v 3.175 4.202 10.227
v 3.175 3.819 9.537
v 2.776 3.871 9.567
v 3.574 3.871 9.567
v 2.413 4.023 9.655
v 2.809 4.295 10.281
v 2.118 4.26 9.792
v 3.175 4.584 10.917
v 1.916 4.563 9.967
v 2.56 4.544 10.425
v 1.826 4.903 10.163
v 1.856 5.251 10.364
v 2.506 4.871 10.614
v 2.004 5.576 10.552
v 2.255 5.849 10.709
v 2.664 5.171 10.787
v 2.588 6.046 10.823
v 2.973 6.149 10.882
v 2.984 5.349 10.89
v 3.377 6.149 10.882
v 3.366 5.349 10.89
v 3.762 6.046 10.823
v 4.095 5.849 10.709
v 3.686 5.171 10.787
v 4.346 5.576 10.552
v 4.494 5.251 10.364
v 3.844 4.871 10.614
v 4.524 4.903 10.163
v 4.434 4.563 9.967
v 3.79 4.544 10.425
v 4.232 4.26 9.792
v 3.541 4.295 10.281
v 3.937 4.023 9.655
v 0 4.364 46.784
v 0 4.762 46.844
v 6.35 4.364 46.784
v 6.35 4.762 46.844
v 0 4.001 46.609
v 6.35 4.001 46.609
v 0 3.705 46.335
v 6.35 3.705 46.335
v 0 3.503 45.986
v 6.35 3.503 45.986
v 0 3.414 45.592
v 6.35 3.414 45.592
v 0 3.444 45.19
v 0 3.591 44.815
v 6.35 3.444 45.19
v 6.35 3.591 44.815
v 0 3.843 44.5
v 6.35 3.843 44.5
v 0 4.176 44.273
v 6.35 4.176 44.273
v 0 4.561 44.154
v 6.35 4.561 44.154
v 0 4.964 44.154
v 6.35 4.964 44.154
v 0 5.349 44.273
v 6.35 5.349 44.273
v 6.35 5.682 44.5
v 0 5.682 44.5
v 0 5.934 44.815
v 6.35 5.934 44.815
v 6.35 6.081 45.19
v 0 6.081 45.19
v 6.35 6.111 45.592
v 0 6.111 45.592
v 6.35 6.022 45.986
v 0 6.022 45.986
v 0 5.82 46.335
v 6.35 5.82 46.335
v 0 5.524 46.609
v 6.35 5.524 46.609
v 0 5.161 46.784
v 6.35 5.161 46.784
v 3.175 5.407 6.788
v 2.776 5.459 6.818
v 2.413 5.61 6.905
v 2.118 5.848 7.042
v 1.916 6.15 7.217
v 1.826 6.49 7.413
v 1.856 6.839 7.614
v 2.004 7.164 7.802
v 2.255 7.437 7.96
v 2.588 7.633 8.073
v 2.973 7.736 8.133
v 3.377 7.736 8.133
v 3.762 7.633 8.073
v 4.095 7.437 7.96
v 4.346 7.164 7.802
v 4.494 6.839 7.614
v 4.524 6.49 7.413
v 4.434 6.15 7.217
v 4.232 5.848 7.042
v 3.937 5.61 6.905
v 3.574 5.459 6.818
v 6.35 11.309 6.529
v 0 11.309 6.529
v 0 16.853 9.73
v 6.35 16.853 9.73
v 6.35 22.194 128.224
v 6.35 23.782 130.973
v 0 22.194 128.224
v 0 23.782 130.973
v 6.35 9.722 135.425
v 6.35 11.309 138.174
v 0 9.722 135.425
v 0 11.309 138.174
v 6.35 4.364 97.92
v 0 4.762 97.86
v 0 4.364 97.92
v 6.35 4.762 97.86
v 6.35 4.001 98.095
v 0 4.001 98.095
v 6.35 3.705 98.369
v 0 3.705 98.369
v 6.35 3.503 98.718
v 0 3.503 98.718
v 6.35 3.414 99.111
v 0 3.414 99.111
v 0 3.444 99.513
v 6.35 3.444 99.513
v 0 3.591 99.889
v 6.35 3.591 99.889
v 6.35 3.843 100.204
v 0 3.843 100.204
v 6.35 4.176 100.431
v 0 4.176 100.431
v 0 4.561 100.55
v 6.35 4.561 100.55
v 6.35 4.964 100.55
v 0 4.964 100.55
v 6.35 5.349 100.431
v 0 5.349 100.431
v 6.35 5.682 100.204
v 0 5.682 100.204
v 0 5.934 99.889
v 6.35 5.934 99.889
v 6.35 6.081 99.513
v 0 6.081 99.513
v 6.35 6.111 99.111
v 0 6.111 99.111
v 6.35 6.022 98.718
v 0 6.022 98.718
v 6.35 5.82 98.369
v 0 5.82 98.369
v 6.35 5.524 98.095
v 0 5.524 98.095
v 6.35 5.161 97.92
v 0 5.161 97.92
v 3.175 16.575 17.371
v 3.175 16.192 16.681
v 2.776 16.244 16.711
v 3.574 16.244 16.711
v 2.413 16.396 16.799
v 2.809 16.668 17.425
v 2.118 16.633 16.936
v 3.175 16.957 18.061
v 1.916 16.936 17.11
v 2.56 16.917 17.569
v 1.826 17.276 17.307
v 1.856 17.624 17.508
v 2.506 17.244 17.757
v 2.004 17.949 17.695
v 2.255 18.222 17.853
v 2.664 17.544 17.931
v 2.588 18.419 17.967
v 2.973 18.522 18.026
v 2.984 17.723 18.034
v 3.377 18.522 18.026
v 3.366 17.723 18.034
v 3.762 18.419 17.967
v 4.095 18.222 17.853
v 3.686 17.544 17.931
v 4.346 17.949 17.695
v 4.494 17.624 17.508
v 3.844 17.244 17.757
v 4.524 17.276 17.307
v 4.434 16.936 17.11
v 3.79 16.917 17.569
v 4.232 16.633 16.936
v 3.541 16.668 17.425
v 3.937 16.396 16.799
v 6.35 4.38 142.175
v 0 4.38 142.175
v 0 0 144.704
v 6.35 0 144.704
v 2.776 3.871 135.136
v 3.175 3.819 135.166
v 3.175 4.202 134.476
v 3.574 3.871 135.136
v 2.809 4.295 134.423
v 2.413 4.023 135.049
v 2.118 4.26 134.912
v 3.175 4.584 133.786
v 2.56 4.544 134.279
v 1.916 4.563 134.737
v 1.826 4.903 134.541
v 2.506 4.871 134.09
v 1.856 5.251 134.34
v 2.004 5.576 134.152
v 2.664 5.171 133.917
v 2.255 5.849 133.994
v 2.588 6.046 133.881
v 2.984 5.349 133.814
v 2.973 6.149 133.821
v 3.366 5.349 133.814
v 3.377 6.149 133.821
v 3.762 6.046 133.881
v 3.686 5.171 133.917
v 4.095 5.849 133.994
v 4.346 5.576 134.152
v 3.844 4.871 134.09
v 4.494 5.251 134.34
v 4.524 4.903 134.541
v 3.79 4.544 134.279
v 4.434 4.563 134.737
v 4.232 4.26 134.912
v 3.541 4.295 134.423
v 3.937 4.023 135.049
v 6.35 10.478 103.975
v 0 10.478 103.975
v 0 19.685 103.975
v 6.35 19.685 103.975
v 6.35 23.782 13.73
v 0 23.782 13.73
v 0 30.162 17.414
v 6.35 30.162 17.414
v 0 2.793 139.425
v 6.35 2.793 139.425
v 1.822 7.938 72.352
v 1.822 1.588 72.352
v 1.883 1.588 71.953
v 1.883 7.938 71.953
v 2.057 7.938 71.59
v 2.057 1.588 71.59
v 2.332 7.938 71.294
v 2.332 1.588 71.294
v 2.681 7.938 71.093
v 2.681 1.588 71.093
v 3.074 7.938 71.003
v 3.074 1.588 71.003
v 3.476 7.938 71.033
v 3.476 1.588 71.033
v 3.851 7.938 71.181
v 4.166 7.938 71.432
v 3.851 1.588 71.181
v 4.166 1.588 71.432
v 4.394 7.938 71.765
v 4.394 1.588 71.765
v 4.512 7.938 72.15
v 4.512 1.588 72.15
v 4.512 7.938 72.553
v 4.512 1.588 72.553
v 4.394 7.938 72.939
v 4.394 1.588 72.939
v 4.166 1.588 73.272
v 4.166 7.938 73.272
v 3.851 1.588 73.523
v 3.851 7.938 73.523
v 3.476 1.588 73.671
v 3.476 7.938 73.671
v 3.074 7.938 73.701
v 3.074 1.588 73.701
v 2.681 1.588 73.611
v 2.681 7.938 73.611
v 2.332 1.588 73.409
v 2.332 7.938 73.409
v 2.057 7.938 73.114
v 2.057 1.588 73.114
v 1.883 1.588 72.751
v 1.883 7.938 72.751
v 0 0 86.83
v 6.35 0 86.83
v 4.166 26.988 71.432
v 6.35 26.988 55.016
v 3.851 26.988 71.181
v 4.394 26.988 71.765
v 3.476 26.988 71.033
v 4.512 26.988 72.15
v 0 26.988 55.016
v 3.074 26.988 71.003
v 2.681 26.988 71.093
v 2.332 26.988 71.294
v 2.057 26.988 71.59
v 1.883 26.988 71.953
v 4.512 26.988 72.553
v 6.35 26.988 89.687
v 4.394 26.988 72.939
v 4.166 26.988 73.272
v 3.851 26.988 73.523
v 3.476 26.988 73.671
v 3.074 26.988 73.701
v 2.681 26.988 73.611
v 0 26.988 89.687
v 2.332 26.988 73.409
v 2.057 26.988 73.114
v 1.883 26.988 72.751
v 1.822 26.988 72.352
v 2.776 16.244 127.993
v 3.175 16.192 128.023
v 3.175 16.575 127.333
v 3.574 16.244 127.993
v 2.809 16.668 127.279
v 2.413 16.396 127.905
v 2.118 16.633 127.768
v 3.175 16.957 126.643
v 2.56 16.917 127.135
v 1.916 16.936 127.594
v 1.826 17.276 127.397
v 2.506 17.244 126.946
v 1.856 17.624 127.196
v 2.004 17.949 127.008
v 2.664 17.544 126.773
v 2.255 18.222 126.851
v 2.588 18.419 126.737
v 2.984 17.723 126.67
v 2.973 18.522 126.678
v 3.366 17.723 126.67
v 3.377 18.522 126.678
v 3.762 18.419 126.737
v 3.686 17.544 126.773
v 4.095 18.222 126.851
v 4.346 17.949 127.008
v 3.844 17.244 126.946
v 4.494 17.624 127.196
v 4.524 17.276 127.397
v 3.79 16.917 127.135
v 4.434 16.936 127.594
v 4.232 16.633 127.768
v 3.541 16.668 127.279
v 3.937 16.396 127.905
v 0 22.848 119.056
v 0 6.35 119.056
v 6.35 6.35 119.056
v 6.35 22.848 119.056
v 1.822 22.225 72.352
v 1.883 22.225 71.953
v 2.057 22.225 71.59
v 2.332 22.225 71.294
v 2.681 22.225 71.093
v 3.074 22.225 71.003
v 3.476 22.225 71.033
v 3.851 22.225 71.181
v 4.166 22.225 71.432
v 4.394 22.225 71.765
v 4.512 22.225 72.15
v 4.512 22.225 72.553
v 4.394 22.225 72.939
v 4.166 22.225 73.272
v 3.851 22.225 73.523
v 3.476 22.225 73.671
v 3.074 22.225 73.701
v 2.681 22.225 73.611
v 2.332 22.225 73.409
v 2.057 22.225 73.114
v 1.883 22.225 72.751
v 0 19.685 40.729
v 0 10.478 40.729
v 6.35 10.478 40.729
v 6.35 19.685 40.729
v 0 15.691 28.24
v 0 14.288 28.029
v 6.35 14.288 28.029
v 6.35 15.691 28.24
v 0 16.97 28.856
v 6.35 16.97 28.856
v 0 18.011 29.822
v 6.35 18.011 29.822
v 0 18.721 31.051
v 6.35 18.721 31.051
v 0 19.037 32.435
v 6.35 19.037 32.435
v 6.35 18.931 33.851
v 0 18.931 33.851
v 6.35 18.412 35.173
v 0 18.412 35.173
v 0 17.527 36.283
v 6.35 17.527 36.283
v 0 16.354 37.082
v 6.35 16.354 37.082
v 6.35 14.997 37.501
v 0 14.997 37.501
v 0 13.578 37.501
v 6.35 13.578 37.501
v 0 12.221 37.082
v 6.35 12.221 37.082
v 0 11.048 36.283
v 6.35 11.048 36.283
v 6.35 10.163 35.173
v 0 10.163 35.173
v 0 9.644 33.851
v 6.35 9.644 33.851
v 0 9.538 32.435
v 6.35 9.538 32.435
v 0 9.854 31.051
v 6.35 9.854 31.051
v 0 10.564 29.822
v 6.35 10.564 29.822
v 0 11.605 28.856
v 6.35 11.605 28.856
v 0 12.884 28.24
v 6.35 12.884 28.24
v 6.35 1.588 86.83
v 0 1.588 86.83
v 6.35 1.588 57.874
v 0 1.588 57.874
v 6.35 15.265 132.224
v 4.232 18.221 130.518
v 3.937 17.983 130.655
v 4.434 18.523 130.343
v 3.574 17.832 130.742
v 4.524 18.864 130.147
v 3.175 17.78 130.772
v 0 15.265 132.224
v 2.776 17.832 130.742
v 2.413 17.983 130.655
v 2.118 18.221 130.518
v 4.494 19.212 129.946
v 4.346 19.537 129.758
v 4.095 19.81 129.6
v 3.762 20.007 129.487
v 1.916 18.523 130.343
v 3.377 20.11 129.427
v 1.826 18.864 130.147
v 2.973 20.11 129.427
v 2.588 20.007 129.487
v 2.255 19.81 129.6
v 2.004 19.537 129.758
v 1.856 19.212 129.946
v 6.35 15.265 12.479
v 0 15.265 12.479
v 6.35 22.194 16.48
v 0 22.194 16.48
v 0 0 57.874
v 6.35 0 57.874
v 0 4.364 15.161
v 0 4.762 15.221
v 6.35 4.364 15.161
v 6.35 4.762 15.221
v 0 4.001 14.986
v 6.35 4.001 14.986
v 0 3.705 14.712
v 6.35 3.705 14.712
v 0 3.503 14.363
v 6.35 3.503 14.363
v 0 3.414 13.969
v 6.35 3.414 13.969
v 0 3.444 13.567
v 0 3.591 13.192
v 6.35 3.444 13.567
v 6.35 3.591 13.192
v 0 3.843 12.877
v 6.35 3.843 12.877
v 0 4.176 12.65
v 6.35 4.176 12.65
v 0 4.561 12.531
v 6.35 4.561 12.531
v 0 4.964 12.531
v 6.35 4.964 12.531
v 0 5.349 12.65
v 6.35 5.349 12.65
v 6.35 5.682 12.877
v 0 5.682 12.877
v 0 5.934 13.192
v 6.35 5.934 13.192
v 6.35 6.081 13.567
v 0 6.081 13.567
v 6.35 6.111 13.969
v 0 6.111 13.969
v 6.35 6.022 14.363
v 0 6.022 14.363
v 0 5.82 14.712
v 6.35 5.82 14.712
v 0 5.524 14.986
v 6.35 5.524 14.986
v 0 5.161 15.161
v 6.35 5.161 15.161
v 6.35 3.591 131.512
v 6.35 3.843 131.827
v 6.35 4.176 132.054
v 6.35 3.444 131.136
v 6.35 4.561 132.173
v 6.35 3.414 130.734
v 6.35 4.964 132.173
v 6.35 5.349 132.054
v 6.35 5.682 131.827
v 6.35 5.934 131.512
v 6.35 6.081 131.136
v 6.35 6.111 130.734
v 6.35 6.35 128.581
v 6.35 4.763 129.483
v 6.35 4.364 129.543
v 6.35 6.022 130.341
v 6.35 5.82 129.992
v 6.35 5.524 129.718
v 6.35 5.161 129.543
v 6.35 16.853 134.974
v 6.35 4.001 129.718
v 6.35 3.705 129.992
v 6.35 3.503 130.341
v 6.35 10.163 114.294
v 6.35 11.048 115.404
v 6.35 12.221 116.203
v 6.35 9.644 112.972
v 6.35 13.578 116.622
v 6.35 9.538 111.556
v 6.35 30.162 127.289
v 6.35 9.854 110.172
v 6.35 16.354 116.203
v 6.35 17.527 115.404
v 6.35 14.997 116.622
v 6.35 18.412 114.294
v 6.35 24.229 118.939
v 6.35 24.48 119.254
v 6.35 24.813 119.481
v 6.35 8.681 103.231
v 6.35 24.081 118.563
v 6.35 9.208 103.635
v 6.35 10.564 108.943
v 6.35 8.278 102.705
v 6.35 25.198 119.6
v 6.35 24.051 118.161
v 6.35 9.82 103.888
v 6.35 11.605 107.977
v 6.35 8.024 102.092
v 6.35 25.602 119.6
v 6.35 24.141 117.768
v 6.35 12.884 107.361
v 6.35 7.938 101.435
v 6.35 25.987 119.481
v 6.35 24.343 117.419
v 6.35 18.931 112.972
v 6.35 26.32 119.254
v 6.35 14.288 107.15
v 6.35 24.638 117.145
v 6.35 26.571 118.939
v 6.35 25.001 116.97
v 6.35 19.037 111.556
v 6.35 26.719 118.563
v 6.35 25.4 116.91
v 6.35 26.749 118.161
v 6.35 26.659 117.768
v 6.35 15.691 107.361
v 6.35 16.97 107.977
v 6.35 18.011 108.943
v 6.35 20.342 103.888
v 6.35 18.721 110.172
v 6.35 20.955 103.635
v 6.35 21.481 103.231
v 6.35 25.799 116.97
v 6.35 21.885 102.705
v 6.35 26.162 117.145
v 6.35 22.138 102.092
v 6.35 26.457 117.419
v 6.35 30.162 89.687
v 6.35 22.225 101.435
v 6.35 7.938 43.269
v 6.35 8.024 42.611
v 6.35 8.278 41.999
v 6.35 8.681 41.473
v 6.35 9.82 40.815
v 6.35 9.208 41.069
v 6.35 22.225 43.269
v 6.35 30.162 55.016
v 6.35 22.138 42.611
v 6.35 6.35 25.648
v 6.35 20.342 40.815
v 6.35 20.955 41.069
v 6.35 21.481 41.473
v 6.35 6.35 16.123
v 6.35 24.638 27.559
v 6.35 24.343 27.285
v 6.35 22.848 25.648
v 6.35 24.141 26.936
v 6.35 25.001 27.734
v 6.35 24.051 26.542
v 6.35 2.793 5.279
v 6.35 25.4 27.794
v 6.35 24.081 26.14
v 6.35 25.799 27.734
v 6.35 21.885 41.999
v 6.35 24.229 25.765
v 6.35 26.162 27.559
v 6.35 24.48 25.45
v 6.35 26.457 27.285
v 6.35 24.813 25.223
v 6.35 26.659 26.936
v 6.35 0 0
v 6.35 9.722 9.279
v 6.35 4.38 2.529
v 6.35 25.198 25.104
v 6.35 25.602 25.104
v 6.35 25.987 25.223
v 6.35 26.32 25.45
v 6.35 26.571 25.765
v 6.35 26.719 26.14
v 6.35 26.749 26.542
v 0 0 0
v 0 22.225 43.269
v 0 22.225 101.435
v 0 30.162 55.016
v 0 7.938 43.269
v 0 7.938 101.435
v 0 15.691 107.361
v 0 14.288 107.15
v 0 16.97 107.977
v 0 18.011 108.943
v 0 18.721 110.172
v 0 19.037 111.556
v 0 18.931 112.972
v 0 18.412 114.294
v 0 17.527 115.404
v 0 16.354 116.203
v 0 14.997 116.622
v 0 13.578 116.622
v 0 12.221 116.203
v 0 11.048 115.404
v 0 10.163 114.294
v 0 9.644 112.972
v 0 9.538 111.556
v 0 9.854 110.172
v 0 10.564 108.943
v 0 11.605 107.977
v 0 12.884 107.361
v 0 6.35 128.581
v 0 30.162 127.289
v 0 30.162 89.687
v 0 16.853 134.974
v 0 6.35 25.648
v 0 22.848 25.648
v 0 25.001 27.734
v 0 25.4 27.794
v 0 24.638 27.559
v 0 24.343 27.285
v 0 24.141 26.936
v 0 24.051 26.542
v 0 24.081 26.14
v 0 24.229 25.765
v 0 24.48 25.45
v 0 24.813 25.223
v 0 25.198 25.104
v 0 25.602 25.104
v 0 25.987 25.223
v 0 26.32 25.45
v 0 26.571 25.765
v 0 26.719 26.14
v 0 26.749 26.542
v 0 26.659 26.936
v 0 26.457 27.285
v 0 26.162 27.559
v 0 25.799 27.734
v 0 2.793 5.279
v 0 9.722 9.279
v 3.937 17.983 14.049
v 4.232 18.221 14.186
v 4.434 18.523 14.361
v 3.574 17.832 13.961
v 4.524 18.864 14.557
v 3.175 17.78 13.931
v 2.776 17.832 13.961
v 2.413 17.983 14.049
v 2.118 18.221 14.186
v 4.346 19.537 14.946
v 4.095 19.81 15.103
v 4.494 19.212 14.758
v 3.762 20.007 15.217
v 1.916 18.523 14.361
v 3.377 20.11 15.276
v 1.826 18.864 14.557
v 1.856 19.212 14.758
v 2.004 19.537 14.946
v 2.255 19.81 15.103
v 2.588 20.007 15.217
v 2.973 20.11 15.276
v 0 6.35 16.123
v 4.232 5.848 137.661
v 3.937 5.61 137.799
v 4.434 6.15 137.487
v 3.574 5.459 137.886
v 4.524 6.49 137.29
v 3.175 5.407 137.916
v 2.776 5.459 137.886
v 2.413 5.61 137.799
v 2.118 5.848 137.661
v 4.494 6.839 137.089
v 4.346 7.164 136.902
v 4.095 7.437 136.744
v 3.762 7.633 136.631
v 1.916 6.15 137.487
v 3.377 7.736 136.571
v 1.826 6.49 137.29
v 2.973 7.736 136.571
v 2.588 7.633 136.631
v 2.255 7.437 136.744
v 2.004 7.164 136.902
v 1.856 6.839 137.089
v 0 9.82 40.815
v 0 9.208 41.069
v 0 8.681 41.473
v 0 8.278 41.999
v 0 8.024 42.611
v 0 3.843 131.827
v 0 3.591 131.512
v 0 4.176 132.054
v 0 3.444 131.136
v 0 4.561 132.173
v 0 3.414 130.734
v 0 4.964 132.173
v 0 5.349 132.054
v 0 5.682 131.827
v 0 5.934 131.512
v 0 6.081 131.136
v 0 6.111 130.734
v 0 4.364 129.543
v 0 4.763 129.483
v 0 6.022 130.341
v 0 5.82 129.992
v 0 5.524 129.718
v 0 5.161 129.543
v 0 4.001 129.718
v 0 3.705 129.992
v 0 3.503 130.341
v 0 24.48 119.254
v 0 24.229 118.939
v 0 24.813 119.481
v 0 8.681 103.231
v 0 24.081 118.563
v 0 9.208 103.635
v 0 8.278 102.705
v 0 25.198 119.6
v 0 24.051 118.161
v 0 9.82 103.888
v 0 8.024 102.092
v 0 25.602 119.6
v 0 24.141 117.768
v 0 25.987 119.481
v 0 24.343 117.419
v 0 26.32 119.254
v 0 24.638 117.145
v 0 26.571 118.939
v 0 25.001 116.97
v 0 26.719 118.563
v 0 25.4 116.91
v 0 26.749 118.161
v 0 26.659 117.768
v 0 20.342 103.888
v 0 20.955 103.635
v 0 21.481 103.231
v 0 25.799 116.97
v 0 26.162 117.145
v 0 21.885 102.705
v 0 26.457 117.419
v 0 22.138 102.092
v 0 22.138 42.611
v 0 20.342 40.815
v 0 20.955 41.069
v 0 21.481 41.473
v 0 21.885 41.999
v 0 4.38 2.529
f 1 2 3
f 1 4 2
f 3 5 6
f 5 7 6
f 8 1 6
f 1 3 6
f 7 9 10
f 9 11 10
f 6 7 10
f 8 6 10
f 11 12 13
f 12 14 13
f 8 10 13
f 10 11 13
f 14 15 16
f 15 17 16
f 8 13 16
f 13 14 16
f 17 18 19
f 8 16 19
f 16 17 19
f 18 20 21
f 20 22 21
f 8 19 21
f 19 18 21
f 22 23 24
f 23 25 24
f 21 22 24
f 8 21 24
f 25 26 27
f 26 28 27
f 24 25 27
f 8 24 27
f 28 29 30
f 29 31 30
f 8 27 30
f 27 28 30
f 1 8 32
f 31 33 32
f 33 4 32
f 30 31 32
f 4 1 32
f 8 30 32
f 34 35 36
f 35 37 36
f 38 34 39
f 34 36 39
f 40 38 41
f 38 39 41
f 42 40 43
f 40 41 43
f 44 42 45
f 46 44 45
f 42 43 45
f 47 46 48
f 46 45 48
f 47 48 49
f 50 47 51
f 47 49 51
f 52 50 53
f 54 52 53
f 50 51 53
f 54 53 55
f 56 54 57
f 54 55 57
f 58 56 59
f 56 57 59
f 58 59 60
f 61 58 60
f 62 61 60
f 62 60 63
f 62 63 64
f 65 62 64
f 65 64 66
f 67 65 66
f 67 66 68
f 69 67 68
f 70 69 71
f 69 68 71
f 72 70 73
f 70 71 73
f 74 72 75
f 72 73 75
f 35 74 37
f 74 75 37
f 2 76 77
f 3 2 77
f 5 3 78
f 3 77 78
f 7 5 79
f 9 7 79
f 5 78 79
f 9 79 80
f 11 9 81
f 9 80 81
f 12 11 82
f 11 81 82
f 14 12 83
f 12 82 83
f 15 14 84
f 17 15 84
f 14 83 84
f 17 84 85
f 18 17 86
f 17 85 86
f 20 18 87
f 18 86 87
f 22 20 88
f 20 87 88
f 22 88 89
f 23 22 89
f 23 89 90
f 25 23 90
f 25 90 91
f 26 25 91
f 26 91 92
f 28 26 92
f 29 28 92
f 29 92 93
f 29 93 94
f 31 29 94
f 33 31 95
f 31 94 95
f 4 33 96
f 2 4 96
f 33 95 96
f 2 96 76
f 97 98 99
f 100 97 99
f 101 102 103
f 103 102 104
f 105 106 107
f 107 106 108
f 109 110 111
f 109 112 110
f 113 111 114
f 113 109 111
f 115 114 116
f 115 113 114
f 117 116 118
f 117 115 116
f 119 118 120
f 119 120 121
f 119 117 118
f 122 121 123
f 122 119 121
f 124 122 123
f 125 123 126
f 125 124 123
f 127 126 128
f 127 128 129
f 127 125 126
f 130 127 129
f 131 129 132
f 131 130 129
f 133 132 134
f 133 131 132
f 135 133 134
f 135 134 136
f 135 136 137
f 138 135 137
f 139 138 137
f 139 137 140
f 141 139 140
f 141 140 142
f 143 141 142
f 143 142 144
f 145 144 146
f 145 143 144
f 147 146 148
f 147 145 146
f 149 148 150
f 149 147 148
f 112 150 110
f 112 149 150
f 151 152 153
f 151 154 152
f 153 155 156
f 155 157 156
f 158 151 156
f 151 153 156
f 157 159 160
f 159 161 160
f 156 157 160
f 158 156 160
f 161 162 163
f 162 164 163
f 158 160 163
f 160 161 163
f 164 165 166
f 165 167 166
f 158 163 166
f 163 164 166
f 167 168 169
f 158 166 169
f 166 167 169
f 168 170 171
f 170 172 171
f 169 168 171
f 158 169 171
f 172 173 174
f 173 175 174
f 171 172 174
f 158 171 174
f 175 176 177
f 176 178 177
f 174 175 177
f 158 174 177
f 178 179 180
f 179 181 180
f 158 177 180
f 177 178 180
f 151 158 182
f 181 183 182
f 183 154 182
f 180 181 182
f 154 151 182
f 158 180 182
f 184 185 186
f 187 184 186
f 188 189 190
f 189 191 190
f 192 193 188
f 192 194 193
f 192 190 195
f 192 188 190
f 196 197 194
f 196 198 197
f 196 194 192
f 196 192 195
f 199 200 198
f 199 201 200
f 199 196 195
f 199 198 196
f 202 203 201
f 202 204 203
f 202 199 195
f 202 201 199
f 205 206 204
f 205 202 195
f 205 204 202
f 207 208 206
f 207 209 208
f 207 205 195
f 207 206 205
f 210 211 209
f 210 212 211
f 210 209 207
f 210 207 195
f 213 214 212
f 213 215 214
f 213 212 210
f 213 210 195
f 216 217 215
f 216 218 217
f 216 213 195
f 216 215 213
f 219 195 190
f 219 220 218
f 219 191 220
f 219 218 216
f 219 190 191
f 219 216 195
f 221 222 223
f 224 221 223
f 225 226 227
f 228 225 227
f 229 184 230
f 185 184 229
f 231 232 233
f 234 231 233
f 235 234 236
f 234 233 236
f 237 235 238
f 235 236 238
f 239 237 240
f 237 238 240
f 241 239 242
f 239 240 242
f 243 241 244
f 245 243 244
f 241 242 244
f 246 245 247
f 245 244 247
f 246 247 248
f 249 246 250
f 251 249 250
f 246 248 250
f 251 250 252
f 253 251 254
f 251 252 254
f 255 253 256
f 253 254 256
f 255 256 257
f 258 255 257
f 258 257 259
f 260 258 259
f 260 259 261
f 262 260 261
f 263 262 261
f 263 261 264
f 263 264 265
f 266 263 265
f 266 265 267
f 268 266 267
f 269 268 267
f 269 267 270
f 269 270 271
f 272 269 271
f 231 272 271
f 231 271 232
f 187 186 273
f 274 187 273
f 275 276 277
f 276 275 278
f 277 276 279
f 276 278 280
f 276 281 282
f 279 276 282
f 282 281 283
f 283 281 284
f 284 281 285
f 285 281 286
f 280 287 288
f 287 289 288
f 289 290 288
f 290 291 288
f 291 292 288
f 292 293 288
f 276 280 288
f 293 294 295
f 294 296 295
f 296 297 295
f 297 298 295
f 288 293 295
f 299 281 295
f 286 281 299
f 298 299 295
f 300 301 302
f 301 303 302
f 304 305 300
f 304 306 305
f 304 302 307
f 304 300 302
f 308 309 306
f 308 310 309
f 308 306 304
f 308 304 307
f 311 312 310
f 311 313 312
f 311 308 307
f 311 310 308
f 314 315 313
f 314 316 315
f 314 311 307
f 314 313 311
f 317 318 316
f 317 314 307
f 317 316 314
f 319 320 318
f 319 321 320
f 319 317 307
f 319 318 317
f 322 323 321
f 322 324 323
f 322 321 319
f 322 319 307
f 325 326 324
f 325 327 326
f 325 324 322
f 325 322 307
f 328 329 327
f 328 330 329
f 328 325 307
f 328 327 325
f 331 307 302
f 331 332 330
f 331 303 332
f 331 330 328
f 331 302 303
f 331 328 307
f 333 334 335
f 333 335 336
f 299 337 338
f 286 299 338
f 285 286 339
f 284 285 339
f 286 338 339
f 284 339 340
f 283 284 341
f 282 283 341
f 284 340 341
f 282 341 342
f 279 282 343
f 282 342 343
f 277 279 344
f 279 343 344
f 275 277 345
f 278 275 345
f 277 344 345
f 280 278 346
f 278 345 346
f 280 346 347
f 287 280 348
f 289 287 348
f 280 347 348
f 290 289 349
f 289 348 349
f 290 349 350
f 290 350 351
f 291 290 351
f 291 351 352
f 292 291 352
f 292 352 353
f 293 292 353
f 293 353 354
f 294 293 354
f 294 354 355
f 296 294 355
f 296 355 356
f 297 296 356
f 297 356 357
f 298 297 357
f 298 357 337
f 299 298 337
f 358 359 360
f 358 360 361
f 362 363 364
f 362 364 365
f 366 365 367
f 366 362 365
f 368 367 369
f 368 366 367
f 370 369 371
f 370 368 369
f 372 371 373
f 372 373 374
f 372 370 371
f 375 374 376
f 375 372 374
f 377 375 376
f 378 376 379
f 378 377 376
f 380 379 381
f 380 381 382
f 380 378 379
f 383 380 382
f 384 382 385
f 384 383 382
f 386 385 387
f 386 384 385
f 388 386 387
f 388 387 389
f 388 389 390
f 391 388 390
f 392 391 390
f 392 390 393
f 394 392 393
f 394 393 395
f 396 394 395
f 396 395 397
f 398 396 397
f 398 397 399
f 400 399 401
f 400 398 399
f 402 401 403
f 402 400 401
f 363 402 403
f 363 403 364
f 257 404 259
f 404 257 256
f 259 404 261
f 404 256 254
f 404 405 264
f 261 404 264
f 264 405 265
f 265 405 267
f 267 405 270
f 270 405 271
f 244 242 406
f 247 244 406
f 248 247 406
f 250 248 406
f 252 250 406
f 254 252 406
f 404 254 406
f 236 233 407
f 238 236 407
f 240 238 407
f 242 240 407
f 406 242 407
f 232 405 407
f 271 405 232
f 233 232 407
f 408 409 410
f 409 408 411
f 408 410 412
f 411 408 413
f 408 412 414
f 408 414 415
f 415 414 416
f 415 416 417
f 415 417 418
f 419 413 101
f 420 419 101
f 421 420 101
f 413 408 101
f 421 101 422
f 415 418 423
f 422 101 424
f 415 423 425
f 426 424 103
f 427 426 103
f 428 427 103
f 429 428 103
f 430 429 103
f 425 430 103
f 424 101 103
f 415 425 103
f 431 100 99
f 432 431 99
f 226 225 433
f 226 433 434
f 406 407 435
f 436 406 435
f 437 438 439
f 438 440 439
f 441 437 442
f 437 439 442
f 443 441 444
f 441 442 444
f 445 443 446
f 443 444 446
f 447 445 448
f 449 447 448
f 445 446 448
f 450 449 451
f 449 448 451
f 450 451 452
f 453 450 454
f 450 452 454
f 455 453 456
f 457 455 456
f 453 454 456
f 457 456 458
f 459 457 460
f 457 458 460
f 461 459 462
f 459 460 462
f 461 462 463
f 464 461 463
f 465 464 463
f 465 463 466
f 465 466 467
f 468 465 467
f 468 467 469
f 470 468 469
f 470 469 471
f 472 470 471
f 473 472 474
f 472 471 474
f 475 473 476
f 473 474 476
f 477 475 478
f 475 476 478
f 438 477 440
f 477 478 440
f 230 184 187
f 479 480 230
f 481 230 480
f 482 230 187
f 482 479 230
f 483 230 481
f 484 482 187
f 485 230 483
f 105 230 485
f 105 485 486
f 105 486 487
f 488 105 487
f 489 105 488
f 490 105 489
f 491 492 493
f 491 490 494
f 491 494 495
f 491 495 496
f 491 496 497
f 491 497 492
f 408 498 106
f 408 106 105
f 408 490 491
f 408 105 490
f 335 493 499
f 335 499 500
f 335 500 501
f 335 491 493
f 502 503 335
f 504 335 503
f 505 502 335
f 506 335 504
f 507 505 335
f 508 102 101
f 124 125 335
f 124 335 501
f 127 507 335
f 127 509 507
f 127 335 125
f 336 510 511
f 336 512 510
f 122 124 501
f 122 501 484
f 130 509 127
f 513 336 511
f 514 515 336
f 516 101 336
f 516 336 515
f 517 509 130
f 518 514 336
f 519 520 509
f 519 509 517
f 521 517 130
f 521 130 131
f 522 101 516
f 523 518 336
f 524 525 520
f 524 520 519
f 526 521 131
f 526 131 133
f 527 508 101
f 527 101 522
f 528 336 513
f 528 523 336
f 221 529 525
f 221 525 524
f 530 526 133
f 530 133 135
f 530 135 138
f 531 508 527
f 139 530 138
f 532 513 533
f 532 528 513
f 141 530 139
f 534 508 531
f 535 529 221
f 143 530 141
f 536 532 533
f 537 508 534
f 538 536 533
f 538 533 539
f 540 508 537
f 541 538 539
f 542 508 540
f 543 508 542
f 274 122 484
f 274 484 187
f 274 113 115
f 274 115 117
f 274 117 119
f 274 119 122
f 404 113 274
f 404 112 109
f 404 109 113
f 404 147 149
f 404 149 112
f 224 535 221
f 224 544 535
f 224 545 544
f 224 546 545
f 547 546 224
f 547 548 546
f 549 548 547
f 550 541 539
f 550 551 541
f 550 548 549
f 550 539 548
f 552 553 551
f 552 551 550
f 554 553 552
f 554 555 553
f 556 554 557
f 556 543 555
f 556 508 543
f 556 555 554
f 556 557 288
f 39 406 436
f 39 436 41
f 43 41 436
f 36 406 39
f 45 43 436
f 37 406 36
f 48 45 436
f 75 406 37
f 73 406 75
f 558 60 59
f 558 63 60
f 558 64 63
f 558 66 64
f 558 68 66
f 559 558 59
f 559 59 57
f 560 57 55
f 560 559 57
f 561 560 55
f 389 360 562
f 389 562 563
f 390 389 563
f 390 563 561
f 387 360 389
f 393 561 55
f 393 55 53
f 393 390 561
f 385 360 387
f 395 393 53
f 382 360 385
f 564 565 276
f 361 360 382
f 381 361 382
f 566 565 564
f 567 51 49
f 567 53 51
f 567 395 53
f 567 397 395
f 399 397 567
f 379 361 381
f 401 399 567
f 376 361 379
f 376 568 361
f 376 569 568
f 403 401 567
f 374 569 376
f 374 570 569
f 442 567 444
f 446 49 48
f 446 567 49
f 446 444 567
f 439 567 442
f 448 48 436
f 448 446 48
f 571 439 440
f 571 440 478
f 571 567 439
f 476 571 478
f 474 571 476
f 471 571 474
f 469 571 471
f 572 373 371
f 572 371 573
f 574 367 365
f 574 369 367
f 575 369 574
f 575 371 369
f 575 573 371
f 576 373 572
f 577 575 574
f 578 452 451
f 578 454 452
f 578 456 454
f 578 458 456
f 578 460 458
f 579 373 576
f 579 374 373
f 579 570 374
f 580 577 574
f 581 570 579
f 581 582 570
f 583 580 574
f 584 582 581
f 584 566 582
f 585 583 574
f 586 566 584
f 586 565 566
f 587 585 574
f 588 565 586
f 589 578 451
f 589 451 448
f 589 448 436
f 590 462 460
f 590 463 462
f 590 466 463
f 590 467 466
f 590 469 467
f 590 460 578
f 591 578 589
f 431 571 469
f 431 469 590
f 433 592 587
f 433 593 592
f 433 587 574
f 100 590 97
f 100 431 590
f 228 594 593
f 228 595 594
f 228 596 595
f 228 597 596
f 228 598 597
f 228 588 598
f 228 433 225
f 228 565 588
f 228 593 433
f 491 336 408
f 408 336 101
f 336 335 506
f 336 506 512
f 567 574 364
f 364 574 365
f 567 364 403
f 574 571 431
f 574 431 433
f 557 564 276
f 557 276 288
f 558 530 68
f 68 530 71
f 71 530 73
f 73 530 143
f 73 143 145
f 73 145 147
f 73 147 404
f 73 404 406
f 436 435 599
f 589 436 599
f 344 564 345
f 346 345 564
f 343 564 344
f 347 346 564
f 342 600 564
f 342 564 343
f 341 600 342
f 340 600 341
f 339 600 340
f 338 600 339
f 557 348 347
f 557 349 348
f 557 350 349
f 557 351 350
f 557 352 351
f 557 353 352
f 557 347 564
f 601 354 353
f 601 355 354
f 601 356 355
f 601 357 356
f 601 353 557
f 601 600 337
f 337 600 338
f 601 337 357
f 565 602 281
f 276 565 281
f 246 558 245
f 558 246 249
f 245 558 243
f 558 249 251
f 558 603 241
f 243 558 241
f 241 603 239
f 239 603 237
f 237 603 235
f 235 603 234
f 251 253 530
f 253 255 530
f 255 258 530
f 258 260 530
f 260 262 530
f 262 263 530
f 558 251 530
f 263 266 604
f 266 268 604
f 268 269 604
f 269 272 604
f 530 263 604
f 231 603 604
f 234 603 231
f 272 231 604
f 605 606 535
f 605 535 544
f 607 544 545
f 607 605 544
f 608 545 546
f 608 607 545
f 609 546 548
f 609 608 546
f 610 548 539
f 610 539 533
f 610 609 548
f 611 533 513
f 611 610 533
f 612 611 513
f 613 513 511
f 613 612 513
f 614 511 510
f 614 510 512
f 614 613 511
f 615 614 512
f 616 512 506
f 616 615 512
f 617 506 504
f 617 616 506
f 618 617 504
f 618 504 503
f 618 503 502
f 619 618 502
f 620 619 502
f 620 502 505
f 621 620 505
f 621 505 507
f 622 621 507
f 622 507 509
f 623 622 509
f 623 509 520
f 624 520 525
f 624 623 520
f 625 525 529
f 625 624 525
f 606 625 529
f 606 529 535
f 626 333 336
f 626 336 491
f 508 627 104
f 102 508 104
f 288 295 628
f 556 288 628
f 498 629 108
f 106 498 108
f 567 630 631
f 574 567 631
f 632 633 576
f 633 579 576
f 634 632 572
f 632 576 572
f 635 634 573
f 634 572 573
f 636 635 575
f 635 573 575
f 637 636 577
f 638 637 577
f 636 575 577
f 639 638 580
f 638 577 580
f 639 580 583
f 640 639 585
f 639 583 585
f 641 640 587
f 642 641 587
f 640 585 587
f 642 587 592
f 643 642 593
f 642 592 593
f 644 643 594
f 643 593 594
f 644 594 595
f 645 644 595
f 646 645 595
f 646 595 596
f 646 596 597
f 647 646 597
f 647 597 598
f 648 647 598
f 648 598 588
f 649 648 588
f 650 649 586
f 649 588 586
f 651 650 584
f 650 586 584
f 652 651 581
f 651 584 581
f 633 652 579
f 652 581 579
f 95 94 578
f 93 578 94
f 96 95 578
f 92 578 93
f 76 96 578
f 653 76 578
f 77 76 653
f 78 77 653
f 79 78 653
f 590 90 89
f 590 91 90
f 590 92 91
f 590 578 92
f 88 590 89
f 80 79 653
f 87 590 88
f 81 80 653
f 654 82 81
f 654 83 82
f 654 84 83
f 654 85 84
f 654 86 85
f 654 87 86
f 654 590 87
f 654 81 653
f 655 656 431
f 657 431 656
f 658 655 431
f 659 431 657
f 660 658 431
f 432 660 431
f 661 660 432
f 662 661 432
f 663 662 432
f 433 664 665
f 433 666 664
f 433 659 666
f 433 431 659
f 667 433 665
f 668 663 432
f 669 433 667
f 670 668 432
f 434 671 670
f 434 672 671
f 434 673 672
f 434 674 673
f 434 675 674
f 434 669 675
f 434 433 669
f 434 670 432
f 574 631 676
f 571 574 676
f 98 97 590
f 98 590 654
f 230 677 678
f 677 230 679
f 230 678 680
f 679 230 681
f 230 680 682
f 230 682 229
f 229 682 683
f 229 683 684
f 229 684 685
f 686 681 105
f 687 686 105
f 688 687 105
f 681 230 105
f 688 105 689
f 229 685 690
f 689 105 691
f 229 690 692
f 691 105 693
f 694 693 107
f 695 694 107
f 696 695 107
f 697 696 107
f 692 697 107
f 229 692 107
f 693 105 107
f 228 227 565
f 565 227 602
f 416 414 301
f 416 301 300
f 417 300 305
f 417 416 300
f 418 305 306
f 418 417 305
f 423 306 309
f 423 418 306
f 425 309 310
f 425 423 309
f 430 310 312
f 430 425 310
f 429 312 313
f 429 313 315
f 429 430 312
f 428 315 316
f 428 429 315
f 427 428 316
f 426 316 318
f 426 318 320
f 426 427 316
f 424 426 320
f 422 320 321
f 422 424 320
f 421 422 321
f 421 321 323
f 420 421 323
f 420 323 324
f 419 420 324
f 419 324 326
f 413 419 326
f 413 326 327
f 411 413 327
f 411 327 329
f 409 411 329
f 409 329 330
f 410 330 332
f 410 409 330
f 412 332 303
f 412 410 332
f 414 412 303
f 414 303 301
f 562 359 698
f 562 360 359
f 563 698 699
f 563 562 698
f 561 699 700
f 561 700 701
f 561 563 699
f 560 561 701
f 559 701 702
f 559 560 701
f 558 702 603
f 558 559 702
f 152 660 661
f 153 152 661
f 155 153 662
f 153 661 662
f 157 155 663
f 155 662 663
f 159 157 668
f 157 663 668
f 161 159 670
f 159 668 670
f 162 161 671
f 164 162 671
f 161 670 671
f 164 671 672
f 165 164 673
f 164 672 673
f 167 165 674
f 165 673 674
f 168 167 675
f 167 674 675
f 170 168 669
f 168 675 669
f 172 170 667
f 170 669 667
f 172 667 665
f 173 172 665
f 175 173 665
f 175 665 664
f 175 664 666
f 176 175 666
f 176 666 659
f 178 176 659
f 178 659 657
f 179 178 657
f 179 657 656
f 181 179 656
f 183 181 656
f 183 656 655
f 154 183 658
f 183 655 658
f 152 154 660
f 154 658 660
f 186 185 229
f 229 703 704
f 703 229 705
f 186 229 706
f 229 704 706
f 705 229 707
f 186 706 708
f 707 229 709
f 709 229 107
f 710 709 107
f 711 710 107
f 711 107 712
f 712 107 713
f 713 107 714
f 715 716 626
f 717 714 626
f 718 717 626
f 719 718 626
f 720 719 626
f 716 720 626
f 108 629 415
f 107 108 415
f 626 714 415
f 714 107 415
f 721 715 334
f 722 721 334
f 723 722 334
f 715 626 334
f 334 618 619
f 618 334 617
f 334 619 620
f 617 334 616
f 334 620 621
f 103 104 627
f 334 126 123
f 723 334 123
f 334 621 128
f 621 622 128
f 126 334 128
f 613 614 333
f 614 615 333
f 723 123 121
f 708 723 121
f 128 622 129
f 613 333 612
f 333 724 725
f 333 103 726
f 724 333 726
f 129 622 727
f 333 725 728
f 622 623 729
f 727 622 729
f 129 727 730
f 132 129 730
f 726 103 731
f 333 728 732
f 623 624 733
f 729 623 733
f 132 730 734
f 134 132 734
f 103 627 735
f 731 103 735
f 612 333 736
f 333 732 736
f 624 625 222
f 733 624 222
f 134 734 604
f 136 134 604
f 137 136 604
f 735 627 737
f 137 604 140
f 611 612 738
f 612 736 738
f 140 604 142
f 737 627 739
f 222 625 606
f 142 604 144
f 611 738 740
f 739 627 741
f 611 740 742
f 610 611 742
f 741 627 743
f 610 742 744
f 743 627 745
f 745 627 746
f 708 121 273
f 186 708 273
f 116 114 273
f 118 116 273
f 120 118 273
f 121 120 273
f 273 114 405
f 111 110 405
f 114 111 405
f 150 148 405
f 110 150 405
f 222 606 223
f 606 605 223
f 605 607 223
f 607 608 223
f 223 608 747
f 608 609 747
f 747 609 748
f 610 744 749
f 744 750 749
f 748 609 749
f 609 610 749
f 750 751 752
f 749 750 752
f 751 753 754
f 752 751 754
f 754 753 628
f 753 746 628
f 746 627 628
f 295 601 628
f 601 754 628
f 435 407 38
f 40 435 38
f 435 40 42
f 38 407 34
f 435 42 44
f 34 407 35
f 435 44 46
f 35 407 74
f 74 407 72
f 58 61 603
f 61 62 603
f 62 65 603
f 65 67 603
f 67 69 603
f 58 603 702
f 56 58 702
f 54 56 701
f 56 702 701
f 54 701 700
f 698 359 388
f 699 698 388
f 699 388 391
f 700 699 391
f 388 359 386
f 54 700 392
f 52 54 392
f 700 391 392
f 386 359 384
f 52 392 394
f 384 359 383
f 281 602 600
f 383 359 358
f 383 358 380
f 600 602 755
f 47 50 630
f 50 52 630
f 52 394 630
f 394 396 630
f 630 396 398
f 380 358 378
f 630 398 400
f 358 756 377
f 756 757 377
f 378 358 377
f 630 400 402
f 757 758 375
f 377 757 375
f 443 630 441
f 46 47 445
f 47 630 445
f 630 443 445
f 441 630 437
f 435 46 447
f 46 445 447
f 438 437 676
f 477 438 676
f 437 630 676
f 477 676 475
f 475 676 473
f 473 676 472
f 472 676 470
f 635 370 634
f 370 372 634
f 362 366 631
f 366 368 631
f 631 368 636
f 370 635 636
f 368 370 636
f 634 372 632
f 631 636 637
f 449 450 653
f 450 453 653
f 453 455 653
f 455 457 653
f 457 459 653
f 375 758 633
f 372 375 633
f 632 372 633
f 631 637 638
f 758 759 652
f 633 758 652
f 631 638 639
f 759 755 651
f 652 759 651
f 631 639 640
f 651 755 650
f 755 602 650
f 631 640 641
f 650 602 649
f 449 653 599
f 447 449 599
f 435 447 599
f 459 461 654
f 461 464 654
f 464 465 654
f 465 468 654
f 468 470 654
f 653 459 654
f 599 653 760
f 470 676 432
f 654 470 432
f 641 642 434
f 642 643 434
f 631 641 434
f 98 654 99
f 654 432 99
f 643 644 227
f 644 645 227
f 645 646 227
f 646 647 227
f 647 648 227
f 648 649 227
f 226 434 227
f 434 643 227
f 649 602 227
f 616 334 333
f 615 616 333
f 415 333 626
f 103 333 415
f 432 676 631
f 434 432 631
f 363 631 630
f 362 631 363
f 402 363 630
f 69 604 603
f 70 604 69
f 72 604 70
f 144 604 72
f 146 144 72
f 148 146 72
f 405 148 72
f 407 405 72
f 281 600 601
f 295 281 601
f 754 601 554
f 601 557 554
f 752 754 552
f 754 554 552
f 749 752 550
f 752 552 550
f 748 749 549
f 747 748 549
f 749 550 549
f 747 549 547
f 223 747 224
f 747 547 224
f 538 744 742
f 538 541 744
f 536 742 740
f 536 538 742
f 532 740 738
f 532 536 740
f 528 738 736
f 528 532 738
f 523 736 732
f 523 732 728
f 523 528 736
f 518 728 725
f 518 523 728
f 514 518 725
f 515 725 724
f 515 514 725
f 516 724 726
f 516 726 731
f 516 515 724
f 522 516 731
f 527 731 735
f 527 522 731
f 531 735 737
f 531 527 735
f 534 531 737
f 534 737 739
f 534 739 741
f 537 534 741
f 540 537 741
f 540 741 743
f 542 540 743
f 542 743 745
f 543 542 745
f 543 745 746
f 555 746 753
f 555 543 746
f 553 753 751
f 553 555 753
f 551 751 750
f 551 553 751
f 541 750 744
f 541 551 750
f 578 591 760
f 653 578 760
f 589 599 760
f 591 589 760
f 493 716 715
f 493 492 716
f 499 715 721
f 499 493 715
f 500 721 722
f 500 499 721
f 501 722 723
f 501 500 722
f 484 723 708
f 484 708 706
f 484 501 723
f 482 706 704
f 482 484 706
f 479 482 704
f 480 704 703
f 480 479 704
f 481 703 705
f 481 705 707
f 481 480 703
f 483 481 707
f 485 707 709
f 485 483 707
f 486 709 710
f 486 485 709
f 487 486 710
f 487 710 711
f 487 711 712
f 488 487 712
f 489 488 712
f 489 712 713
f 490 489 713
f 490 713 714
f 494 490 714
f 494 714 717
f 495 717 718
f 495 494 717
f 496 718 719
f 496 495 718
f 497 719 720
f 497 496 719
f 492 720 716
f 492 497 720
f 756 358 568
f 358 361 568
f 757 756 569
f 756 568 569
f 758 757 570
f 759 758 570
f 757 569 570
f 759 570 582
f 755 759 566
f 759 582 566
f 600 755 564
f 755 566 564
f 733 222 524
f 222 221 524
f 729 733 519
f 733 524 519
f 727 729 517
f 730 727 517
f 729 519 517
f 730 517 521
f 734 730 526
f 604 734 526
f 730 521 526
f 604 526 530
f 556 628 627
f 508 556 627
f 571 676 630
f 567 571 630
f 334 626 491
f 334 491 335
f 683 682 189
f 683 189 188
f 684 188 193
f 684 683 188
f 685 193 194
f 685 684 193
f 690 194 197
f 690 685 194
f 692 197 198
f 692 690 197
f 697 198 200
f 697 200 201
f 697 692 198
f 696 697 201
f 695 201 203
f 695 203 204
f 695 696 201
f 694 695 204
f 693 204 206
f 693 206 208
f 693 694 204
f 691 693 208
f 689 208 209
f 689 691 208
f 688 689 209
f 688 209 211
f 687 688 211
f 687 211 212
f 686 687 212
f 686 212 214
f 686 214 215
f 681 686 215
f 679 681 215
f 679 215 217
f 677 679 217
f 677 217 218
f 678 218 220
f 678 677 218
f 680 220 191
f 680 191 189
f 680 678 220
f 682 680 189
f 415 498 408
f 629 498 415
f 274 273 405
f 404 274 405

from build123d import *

# Parameters (mm, degrees)
SKETCH1_R                          = 4.7625
BOSS_EXTRUDE1_DEPTH                = 6.35
TAP_DRILL_FOR_6_32_TAP2_AT_2_COUNT = 2
TAP_DRILL_FOR_6_32_TAP2_AT_2_PITCH = 14.2875
SKETCH18_W                         = 63.246
SKETCH18_H                         = 14.2875
CUT_EXTRUDE1_DEPTH                 = 148.950291114
FILLET1_R                          = 2.54
TAP_DRILL_FOR_6_32_TAP4_D          = 2.7051
TAP_DRILL_FOR_6_32_TAP1_AT_2_COUNT = 2
TAP_DRILL_FOR_6_32_TAP1_AT_2_PITCH = 28.085742046
TAP_DRILL_FOR_6_32_TAP1_AT_3_COUNT = 2
TAP_DRILL_FOR_6_32_TAP1_AT_3_PITCH = 24.165817496
SKETCH23_W                         = 6.35
SKETCH23_H                         = 8.001
CUT_EXTRUDE2_DEPTH                 = 3.175


with BuildPart() as part:
    # Sketch1 → Boss-Extrude1 (new body)
    with BuildSketch(Plane(origin=(0, 0, 0), x_dir=(0, 0, -1), z_dir=(1, 0, 0))):
        Polygon((0, 0), (-17.414327494, 30.1625), (-55.0164, 30.1625), (-55.0164, 26.9875), (-89.6874, 26.9875), (-89.6874, 30.1625), (-127.289472506, 30.1625), (-144.7038, 0), (-86.8299, 0), (-86.8299, 1.5875), (-57.8739, 1.5875), (-57.8739, 0), align=None)
        with Locations((-111.9124, 14.2875)):
            Circle(SKETCH1_R, mode=Mode.SUBTRACT)
        with Locations((-32.7914, 14.2875)):
            Circle(SKETCH1_R, mode=Mode.SUBTRACT)
    extrude(amount=BOSS_EXTRUDE1_DEPTH)

    # Sketch14 → Tap Drill for #6-32 Tap2 (revolve, cut)
    with BuildSketch(Plane(origin=(3.175, 8.165454744, 139.989472506), x_dir=(0, -0.8660254037844365, 0.500000000000004), z_dir=(1, 0, 0))):
        Polygon((0, 0), (0, 7.16269403), (1.35255, 6.35), (1.35255, 0), align=None)
    tap_drill_for_6_32_tap2 = revolve(axis=Axis((3.175, 11.340454744, 145.48873382), (0, -0.5000000000000039, -0.8660254037844364)), mode=Mode.SUBTRACT)

    # Tap Drill for #6-32 Tap2 at 2: Tap Drill for #6-32 Tap2 ×2
    with Locations(*[Vector(0, 0.8660254037844364, -0.500000000000004) * (i * TAP_DRILL_FOR_6_32_TAP2_AT_2_PITCH) for i in range(1, TAP_DRILL_FOR_6_32_TAP2_AT_2_COUNT)]):
        add(tap_drill_for_6_32_tap2, mode=Mode.SUBTRACT)

    # Sketch18 → Cut-Extrude1 (cut, through all)
    with BuildSketch(Plane.ZY):
        Polygon((16.12265, 6.35), (25.64765, 6.35), (25.64765, 22.847783942), align=None)
        with Locations((72.3519, 15.08125)):
            Rectangle(SKETCH18_W, SKETCH18_H)
        Polygon((119.05615, 6.35), (119.05615, 22.847783942), (128.58115, 6.35), align=None)
    extrude(amount=-CUT_EXTRUDE1_DEPTH, mode=Mode.SUBTRACT)

    # Fillet1
    fillet1_edges = [part.edges().sort_by_distance(p)[0] for p in [
        (3.175, 7.9375, 40.7289),
        (3.175, 22.225, 40.7289),
        (3.175, 22.225, 103.9749),
        (3.175, 7.9375, 103.9749),
    ]]
    fillet(fillet1_edges, radius=FILLET1_R)

    # Tap Drill for #6-32 Tap4 (through all)
    with Locations(Plane(origin=(0, 26.9875, 0), x_dir=(1, 0, 0), z_dir=(0, 1, 0))):
        with Locations((3.175, -72.3519)):
            Hole(TAP_DRILL_FOR_6_32_TAP4_D / 2)

    # Mirror1: Tap Drill for #6-32 Tap2 across plane
    add(tap_drill_for_6_32_tap2.mirror(Plane(origin=(0, 0, 72.3519), x_dir=(1, 0, 0), z_dir=(0, 0, -1))), mode=Mode.SUBTRACT)

    # Mirror1 copy 1 sketch → Mirror1 copy 1 (revolve, cut)
    with BuildSketch(Plane(origin=(3.175, 20.5387927, 11.858077494), x_dir=(0, -0.8660254037844365, -0.500000000000004), z_dir=(1, 0, 0))):
        Polygon((0, 0), (0, -7.16269403), (1.35255, -6.35), (1.35255, 0), align=None)
    revolve(axis=Axis((3.175, 23.7137927, 6.35881618), (0, 0.5000000000000039, -0.8660254037844364)), mode=Mode.SUBTRACT)

    # Sketch12 → Tap Drill for #6-32 Tap1 (revolve, cut)
    with BuildSketch(Plane(origin=(6.35, 25.4, 118.2624), x_dir=(0, 0, -1), z_dir=(0, 1, 0))):
        Polygon((0, 0), (0, 7.16269403), (1.35255, 6.35), (1.35255, 0), align=None)
    tap_drill_for_6_32_tap1 = revolve(axis=Axis((12.7, 25.4, 118.2624), (-1, 0, 0)), mode=Mode.SUBTRACT)

    # Tap Drill for #6-32 Tap1 at 2: Tap Drill for #6-32 Tap1 ×2
    with Locations(*[Vector(0, -0.734803444627488, -0.6782801027330657) * (i * TAP_DRILL_FOR_6_32_TAP1_AT_2_PITCH) for i in range(1, TAP_DRILL_FOR_6_32_TAP1_AT_2_COUNT)]):
        add(tap_drill_for_6_32_tap1, mode=Mode.SUBTRACT)

    # Tap Drill for #6-32 Tap1 at 3: Tap Drill for #6-32 Tap1 ×2
    with Locations(*[Vector(0, -0.8539955250185772, 0.5202803506267027) * (i * TAP_DRILL_FOR_6_32_TAP1_AT_3_PITCH) for i in range(1, TAP_DRILL_FOR_6_32_TAP1_AT_3_COUNT)]):
        add(tap_drill_for_6_32_tap1, mode=Mode.SUBTRACT)

    # Mirror2: Tap Drill for #6-32 Tap1 across plane
    add(tap_drill_for_6_32_tap1.mirror(Plane(origin=(0, 0, 72.3519), x_dir=(1, 0, 0), z_dir=(0, 0, -1))), mode=Mode.SUBTRACT)

    # Mirror2 copy 1 sketch → Mirror2 copy 1 (revolve, cut)
    with BuildSketch(Plane(origin=(6.35, 4.7625, 45.4914), x_dir=(0, 0, 1), z_dir=(0, 1, 0))):
        Polygon((0, 0), (0, -7.16269403), (1.35255, -6.35), (1.35255, 0), align=None)
    revolve(axis=Axis((12.7, 4.7625, 45.4914), (1, 0, 0)), mode=Mode.SUBTRACT)

    # Mirror2 copy 2 sketch → Mirror2 copy 2 (revolve, cut)
    with BuildSketch(Plane(origin=(6.35, 4.7625, 13.8684), x_dir=(0, 0, 1), z_dir=(0, 1, 0))):
        Polygon((0, 0), (0, -7.16269403), (1.35255, -6.35), (1.35255, 0), align=None)
    revolve(axis=Axis((12.7, 4.7625, 13.8684), (1, 0, 0)), mode=Mode.SUBTRACT)

    # Sketch23 → Cut-Extrude2 (cut)
    with BuildSketch(Plane(origin=(0, 0, 0), x_dir=(-1, 0, 0), z_dir=(0, 0.49999999999999806, -0.8660254037844397))):
        with Locations((-3.175, 23.460115329)):
            Rectangle(SKETCH23_W, SKETCH23_H)
        with Locations((-3.175, 9.058315329)):
            Rectangle(SKETCH23_W, SKETCH23_H)
    cut_extrude2 = extrude(amount=-CUT_EXTRUDE2_DEPTH, mode=Mode.SUBTRACT)

    # Mirror3: Cut-Extrude2 across plane
    add(cut_extrude2.mirror(Plane(origin=(0, 0, 72.3519), x_dir=(1, 0, 0), z_dir=(0, 0, -1))), mode=Mode.SUBTRACT)


solid = part.part
